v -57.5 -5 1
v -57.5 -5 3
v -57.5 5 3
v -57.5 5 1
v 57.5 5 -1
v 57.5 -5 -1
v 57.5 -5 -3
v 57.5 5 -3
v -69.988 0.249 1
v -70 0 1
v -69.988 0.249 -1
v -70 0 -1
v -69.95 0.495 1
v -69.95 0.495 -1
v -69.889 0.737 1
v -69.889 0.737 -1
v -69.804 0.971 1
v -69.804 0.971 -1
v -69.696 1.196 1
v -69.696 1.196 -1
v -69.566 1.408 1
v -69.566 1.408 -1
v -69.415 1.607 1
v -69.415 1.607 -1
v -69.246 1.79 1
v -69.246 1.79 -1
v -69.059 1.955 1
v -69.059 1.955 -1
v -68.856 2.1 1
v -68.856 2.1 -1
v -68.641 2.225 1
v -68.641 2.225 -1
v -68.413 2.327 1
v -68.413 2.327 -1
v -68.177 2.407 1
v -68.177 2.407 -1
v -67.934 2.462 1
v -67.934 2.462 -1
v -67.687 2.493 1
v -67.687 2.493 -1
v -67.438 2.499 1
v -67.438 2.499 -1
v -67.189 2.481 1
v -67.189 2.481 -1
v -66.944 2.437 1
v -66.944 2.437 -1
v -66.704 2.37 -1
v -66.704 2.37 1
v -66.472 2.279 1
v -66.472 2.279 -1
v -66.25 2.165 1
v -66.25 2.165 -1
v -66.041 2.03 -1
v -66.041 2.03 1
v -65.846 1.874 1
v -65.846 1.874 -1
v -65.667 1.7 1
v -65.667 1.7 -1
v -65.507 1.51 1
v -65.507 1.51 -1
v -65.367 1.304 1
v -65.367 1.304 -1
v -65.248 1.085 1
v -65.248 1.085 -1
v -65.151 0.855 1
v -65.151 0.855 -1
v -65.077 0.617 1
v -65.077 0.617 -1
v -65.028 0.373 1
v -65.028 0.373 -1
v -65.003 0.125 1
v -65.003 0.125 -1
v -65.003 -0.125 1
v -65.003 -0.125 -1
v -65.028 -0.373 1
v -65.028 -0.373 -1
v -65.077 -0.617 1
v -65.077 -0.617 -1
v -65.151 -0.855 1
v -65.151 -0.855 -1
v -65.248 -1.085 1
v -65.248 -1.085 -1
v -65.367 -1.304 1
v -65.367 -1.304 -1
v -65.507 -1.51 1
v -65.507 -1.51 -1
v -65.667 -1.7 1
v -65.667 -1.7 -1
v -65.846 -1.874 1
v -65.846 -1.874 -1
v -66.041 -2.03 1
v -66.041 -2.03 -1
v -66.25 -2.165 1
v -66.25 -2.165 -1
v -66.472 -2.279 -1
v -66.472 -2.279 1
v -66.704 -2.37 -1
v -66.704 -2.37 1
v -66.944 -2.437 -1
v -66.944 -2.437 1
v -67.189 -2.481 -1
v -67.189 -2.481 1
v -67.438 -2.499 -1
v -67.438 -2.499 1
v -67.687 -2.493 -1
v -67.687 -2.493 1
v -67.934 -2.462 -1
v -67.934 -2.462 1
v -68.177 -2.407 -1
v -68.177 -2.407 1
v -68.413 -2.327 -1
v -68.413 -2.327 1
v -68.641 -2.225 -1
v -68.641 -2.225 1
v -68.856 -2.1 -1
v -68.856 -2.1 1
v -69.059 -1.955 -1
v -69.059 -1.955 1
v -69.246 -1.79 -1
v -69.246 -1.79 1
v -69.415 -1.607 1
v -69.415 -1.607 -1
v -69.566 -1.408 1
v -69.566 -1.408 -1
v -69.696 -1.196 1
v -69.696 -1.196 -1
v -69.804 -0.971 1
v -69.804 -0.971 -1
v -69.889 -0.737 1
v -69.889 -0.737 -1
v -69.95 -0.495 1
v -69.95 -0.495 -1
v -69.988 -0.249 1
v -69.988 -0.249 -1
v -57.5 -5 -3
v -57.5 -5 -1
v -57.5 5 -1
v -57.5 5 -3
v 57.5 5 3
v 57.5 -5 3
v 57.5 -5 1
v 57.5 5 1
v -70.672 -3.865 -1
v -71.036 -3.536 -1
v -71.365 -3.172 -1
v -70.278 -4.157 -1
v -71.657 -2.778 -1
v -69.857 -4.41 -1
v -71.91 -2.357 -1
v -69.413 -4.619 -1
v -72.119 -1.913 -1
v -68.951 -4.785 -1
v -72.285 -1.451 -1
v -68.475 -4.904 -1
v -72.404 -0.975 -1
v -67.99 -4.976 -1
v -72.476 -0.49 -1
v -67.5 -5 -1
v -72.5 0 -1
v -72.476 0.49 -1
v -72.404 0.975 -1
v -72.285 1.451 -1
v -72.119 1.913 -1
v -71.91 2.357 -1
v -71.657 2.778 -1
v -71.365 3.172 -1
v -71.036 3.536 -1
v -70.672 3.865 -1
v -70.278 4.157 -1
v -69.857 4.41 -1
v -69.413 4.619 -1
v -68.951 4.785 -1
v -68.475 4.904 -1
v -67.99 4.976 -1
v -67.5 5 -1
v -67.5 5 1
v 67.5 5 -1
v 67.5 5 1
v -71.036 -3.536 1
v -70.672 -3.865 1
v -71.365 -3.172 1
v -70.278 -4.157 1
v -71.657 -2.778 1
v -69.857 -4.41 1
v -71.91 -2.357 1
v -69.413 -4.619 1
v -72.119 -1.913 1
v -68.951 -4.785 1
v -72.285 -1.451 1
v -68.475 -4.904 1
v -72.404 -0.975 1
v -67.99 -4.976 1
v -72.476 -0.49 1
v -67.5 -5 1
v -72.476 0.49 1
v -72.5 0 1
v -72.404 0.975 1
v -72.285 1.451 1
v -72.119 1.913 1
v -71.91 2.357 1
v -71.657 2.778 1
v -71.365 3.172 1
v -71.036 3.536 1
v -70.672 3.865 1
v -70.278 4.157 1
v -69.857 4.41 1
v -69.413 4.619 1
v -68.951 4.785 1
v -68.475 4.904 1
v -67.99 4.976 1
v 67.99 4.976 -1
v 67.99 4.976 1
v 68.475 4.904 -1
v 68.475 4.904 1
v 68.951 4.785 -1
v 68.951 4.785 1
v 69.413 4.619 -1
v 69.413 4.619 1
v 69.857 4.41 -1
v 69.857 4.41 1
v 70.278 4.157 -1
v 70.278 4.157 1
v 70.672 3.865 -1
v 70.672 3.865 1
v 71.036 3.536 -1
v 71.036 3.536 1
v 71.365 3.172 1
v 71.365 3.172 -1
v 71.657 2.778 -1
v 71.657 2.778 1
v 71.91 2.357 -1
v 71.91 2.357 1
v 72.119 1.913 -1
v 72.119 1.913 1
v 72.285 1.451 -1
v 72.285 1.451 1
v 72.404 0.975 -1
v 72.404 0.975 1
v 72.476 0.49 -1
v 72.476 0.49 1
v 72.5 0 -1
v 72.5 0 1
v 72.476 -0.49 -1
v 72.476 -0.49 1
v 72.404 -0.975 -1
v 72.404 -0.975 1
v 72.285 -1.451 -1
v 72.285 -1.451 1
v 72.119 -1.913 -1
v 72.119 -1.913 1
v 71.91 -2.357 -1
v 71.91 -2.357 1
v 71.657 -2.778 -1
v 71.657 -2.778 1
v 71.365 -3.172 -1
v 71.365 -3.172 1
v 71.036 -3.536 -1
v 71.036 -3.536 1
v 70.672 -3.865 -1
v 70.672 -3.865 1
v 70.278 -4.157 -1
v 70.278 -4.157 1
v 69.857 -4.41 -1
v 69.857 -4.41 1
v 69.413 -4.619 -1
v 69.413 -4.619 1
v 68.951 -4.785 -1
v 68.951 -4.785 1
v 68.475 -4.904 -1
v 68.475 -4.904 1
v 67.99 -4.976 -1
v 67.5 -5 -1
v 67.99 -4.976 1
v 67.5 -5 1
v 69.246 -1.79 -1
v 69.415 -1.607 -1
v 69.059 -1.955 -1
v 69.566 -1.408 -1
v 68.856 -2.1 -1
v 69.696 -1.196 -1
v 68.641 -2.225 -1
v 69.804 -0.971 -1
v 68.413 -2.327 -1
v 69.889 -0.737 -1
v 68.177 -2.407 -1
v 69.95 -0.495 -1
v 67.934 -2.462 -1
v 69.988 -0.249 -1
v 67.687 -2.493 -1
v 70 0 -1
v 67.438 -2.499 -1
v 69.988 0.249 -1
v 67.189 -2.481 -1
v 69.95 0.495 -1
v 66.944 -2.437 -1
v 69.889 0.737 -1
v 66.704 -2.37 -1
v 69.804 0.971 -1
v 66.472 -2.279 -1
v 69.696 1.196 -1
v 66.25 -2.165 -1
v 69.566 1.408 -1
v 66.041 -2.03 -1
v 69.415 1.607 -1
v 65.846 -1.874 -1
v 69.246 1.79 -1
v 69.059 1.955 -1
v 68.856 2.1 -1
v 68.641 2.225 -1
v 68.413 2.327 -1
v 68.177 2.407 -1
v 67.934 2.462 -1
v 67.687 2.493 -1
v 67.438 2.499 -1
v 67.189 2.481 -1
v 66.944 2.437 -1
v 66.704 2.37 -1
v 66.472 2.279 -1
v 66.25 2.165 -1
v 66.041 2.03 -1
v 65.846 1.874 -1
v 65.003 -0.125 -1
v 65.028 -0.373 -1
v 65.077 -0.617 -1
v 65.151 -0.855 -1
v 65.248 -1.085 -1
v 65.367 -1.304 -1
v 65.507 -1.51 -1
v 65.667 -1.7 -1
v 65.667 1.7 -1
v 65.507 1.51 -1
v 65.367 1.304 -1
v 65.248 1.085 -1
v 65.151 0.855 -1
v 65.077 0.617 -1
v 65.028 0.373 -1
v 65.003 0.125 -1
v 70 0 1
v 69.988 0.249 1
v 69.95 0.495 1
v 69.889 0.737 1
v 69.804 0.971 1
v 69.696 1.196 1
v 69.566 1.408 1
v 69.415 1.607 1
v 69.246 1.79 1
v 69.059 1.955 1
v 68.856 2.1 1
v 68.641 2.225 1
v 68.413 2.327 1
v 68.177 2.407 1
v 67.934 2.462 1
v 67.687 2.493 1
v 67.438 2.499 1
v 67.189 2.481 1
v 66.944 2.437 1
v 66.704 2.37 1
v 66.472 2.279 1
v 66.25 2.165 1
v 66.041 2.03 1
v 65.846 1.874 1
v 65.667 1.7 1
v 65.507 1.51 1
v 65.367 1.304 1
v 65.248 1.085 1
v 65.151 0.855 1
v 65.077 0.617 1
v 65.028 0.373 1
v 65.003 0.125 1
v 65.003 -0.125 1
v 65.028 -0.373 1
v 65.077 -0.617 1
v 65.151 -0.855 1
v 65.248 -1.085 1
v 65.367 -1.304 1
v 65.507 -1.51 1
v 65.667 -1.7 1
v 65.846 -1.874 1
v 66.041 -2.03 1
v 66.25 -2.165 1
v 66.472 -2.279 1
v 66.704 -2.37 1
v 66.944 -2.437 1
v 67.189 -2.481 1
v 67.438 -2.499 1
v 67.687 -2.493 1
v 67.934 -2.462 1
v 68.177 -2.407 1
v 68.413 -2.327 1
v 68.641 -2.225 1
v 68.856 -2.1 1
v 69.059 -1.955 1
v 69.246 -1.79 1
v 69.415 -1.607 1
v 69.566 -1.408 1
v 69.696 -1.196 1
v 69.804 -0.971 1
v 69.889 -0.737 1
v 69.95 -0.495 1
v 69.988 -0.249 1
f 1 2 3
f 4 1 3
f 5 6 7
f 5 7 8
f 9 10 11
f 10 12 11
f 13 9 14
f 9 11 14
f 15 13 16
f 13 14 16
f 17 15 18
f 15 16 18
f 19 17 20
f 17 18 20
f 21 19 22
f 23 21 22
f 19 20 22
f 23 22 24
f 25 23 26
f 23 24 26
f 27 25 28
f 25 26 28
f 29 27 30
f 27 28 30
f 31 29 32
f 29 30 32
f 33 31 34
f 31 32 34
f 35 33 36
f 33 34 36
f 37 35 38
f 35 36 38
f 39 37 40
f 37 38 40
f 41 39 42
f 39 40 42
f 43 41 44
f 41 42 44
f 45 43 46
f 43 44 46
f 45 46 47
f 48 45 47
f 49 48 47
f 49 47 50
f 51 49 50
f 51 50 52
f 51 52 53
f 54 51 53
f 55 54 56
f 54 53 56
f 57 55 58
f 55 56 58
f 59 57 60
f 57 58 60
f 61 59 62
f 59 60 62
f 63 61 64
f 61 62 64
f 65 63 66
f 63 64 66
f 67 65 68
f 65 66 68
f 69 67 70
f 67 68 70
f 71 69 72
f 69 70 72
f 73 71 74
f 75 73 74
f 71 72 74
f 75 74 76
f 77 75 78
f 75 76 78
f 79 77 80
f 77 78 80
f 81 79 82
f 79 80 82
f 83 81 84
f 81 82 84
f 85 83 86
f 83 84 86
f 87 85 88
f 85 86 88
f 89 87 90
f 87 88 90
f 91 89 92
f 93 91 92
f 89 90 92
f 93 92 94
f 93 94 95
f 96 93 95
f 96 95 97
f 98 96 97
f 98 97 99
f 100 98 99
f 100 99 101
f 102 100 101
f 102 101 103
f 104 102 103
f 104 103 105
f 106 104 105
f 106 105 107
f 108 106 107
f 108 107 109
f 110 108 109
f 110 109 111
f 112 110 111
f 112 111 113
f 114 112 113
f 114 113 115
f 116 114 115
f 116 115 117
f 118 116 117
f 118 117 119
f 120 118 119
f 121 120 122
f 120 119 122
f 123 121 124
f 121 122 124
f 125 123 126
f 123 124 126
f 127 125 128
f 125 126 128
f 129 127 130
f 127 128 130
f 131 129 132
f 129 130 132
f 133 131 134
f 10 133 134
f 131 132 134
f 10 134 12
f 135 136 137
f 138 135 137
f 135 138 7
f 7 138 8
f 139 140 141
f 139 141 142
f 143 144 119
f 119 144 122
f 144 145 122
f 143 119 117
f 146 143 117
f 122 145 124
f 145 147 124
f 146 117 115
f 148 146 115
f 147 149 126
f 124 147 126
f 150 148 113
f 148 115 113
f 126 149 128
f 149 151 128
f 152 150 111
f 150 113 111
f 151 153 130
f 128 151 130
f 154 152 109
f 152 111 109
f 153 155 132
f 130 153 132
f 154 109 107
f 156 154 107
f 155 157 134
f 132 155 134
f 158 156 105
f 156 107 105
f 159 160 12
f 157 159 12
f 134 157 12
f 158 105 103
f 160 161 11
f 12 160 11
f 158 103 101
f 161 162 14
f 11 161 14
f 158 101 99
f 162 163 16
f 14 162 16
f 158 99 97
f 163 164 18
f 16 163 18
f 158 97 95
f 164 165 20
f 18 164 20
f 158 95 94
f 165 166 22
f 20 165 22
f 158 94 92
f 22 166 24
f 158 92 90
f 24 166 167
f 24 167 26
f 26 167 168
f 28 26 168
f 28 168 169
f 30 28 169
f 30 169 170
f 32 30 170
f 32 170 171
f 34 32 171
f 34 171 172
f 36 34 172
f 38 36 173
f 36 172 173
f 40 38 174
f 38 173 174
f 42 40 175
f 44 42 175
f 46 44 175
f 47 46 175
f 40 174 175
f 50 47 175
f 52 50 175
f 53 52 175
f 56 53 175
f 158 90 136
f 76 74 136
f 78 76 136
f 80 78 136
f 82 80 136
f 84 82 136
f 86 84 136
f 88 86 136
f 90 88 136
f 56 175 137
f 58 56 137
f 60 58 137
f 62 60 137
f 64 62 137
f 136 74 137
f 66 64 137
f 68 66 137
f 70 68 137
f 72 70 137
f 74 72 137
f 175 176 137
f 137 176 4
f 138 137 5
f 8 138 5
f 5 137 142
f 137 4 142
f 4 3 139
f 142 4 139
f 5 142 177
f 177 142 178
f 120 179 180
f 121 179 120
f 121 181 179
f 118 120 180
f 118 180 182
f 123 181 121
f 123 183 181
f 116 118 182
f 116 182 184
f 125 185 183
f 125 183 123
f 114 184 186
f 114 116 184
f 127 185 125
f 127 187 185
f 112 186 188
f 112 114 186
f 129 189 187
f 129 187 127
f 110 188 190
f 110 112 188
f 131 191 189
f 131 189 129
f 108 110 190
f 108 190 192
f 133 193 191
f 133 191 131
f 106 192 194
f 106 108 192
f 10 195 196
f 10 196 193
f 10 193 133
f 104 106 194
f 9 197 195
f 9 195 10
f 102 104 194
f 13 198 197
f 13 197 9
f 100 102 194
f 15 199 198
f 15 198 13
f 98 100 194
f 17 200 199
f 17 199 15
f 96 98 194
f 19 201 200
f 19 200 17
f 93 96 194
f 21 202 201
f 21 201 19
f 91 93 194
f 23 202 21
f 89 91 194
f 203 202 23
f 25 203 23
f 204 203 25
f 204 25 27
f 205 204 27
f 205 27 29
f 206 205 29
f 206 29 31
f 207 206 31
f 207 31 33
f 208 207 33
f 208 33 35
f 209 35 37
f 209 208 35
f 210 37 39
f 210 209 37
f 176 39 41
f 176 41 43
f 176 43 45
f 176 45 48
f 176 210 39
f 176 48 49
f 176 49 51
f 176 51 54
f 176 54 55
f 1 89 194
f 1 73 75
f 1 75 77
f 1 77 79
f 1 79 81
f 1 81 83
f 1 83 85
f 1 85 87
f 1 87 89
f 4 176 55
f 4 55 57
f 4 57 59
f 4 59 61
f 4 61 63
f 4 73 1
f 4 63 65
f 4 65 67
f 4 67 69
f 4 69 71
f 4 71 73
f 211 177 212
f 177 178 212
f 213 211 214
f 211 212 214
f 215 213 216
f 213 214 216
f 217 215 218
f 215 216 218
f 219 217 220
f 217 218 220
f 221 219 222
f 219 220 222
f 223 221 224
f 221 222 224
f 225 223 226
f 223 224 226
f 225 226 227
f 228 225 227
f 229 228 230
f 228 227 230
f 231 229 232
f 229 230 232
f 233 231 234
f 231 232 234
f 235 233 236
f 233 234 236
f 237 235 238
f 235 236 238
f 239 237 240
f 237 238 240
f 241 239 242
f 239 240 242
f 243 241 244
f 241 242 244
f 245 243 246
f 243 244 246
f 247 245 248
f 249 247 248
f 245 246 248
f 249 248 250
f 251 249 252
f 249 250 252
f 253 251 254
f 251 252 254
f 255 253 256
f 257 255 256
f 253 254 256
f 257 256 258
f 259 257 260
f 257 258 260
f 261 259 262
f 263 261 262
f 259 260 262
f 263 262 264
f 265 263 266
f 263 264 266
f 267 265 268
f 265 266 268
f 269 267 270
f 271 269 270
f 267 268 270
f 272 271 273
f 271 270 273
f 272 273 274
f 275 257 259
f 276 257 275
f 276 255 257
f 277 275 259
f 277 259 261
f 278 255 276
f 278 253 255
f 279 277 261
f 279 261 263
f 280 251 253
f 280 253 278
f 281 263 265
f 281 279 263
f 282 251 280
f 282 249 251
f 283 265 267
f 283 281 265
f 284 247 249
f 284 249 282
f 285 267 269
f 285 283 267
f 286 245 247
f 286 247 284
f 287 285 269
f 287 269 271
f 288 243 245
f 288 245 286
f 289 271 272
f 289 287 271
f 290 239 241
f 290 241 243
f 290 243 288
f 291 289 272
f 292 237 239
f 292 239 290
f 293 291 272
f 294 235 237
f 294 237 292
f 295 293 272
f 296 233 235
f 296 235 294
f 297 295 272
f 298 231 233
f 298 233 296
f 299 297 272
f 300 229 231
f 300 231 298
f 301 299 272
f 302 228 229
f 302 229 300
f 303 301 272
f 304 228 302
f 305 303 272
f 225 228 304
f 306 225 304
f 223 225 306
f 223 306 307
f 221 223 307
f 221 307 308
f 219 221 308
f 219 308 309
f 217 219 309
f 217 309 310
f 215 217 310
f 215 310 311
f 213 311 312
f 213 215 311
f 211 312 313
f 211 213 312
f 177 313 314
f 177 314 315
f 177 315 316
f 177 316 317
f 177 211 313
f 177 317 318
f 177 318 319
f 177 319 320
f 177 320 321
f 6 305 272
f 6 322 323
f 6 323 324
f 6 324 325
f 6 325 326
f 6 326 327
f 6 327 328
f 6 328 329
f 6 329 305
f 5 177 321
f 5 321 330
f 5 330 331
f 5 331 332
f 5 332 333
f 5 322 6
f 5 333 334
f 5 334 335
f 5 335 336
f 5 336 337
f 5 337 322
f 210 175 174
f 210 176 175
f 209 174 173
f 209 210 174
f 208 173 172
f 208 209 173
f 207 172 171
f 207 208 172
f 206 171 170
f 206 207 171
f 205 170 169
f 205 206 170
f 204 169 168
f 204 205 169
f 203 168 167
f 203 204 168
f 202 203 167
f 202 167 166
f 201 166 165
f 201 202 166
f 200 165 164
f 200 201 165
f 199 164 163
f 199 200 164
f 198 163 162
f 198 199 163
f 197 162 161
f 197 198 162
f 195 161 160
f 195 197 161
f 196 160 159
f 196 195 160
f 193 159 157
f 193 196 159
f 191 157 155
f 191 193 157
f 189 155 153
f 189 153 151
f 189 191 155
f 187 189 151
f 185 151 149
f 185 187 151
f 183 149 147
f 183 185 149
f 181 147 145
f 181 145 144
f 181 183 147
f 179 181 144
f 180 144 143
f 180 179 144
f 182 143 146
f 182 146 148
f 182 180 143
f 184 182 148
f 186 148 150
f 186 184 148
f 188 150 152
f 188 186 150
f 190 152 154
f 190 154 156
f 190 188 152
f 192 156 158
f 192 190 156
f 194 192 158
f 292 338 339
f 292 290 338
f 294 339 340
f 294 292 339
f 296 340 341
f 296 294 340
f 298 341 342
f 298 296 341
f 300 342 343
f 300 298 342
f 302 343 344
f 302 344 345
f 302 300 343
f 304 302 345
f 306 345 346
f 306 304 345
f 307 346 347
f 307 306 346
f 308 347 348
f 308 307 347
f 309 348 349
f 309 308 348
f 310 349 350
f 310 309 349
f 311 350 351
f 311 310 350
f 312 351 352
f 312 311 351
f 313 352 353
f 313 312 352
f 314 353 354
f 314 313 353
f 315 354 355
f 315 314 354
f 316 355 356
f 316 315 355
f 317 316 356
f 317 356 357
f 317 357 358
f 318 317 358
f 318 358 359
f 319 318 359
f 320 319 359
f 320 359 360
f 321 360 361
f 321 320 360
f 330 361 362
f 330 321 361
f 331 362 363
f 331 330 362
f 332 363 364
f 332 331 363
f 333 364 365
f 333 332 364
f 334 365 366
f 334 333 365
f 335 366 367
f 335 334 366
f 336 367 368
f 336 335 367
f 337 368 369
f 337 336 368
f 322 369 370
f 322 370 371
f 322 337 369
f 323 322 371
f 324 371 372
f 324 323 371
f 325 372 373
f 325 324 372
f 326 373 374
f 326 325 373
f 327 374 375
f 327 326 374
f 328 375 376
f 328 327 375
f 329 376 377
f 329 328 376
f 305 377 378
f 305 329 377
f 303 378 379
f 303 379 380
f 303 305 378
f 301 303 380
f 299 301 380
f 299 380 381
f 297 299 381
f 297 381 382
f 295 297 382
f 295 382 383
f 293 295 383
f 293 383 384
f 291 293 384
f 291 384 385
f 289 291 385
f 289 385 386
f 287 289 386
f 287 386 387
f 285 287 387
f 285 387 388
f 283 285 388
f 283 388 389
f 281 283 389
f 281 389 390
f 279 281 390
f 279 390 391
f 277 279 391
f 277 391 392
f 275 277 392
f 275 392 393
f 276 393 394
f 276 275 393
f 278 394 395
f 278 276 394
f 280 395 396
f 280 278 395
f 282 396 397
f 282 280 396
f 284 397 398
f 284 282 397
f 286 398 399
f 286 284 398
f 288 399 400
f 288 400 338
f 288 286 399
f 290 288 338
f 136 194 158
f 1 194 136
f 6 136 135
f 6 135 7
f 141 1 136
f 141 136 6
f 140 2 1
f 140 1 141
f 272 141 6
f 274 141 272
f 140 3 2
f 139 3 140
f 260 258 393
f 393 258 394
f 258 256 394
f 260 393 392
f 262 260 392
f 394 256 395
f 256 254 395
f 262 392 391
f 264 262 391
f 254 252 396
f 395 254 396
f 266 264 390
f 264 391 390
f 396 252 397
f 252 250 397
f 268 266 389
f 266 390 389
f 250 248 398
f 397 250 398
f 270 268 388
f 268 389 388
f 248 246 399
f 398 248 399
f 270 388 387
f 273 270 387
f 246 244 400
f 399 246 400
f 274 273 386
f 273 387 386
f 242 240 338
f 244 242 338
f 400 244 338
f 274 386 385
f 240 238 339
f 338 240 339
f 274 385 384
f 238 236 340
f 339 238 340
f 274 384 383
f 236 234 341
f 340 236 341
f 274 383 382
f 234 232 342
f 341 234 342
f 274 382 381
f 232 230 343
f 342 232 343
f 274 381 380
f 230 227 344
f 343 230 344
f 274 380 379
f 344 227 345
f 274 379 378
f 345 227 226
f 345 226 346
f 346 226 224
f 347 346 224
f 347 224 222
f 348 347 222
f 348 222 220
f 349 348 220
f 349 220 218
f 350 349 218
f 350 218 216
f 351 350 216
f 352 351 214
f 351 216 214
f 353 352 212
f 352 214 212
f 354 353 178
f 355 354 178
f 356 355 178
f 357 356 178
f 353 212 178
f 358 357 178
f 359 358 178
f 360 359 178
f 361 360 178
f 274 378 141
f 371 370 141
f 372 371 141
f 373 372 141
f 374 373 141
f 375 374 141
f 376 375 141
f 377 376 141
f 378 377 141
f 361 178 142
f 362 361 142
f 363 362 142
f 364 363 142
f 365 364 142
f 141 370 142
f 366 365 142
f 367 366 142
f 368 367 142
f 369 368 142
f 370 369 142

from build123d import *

# Parameters (mm, degrees)
SKETCH19_W          = 115
SKETCH19_H          = 10
BOSS_EXTRUDE4_DEPTH = 3
SKETCH22_R          = 2.5
BOSS_EXTRUDE5_DEPTH = 1


with BuildPart() as part:
    # Sketch19 → Boss-Extrude4 (new body, symmetric)
    with BuildSketch(Plane.XY):
        Rectangle(SKETCH19_W, SKETCH19_H)
    boss_extrude4 = extrude(amount=BOSS_EXTRUDE4_DEPTH, both=True)

    # Sketch22 → Boss-Extrude5 (add, symmetric)
    with BuildSketch(Plane.XY):
        with BuildLine():
            Line((57.5, 5), (67.5, 5))
            ThreePointArc((67.5, 5), (72.5, 0), (67.5, -5))
            Line((67.5, -5), (57.5, -5))
            Line((57.5, -5), (57.5, 5))
        make_face()
        with Locations((67.5, 0)):
            Circle(SKETCH22_R, mode=Mode.SUBTRACT)
    boss_extrude5 = extrude(amount=BOSS_EXTRUDE5_DEPTH, both=True)

    # Mirror1: Boss-Extrude4, Boss-Extrude5 across plane
    add(boss_extrude4.mirror(Plane(origin=(0, 0, 0), x_dir=(0, 0, 1), z_dir=(1, 0, 0))))
    add(boss_extrude5.mirror(Plane(origin=(0, 0, 0), x_dir=(0, 0, 1), z_dir=(1, 0, 0))))


solid = part.part
